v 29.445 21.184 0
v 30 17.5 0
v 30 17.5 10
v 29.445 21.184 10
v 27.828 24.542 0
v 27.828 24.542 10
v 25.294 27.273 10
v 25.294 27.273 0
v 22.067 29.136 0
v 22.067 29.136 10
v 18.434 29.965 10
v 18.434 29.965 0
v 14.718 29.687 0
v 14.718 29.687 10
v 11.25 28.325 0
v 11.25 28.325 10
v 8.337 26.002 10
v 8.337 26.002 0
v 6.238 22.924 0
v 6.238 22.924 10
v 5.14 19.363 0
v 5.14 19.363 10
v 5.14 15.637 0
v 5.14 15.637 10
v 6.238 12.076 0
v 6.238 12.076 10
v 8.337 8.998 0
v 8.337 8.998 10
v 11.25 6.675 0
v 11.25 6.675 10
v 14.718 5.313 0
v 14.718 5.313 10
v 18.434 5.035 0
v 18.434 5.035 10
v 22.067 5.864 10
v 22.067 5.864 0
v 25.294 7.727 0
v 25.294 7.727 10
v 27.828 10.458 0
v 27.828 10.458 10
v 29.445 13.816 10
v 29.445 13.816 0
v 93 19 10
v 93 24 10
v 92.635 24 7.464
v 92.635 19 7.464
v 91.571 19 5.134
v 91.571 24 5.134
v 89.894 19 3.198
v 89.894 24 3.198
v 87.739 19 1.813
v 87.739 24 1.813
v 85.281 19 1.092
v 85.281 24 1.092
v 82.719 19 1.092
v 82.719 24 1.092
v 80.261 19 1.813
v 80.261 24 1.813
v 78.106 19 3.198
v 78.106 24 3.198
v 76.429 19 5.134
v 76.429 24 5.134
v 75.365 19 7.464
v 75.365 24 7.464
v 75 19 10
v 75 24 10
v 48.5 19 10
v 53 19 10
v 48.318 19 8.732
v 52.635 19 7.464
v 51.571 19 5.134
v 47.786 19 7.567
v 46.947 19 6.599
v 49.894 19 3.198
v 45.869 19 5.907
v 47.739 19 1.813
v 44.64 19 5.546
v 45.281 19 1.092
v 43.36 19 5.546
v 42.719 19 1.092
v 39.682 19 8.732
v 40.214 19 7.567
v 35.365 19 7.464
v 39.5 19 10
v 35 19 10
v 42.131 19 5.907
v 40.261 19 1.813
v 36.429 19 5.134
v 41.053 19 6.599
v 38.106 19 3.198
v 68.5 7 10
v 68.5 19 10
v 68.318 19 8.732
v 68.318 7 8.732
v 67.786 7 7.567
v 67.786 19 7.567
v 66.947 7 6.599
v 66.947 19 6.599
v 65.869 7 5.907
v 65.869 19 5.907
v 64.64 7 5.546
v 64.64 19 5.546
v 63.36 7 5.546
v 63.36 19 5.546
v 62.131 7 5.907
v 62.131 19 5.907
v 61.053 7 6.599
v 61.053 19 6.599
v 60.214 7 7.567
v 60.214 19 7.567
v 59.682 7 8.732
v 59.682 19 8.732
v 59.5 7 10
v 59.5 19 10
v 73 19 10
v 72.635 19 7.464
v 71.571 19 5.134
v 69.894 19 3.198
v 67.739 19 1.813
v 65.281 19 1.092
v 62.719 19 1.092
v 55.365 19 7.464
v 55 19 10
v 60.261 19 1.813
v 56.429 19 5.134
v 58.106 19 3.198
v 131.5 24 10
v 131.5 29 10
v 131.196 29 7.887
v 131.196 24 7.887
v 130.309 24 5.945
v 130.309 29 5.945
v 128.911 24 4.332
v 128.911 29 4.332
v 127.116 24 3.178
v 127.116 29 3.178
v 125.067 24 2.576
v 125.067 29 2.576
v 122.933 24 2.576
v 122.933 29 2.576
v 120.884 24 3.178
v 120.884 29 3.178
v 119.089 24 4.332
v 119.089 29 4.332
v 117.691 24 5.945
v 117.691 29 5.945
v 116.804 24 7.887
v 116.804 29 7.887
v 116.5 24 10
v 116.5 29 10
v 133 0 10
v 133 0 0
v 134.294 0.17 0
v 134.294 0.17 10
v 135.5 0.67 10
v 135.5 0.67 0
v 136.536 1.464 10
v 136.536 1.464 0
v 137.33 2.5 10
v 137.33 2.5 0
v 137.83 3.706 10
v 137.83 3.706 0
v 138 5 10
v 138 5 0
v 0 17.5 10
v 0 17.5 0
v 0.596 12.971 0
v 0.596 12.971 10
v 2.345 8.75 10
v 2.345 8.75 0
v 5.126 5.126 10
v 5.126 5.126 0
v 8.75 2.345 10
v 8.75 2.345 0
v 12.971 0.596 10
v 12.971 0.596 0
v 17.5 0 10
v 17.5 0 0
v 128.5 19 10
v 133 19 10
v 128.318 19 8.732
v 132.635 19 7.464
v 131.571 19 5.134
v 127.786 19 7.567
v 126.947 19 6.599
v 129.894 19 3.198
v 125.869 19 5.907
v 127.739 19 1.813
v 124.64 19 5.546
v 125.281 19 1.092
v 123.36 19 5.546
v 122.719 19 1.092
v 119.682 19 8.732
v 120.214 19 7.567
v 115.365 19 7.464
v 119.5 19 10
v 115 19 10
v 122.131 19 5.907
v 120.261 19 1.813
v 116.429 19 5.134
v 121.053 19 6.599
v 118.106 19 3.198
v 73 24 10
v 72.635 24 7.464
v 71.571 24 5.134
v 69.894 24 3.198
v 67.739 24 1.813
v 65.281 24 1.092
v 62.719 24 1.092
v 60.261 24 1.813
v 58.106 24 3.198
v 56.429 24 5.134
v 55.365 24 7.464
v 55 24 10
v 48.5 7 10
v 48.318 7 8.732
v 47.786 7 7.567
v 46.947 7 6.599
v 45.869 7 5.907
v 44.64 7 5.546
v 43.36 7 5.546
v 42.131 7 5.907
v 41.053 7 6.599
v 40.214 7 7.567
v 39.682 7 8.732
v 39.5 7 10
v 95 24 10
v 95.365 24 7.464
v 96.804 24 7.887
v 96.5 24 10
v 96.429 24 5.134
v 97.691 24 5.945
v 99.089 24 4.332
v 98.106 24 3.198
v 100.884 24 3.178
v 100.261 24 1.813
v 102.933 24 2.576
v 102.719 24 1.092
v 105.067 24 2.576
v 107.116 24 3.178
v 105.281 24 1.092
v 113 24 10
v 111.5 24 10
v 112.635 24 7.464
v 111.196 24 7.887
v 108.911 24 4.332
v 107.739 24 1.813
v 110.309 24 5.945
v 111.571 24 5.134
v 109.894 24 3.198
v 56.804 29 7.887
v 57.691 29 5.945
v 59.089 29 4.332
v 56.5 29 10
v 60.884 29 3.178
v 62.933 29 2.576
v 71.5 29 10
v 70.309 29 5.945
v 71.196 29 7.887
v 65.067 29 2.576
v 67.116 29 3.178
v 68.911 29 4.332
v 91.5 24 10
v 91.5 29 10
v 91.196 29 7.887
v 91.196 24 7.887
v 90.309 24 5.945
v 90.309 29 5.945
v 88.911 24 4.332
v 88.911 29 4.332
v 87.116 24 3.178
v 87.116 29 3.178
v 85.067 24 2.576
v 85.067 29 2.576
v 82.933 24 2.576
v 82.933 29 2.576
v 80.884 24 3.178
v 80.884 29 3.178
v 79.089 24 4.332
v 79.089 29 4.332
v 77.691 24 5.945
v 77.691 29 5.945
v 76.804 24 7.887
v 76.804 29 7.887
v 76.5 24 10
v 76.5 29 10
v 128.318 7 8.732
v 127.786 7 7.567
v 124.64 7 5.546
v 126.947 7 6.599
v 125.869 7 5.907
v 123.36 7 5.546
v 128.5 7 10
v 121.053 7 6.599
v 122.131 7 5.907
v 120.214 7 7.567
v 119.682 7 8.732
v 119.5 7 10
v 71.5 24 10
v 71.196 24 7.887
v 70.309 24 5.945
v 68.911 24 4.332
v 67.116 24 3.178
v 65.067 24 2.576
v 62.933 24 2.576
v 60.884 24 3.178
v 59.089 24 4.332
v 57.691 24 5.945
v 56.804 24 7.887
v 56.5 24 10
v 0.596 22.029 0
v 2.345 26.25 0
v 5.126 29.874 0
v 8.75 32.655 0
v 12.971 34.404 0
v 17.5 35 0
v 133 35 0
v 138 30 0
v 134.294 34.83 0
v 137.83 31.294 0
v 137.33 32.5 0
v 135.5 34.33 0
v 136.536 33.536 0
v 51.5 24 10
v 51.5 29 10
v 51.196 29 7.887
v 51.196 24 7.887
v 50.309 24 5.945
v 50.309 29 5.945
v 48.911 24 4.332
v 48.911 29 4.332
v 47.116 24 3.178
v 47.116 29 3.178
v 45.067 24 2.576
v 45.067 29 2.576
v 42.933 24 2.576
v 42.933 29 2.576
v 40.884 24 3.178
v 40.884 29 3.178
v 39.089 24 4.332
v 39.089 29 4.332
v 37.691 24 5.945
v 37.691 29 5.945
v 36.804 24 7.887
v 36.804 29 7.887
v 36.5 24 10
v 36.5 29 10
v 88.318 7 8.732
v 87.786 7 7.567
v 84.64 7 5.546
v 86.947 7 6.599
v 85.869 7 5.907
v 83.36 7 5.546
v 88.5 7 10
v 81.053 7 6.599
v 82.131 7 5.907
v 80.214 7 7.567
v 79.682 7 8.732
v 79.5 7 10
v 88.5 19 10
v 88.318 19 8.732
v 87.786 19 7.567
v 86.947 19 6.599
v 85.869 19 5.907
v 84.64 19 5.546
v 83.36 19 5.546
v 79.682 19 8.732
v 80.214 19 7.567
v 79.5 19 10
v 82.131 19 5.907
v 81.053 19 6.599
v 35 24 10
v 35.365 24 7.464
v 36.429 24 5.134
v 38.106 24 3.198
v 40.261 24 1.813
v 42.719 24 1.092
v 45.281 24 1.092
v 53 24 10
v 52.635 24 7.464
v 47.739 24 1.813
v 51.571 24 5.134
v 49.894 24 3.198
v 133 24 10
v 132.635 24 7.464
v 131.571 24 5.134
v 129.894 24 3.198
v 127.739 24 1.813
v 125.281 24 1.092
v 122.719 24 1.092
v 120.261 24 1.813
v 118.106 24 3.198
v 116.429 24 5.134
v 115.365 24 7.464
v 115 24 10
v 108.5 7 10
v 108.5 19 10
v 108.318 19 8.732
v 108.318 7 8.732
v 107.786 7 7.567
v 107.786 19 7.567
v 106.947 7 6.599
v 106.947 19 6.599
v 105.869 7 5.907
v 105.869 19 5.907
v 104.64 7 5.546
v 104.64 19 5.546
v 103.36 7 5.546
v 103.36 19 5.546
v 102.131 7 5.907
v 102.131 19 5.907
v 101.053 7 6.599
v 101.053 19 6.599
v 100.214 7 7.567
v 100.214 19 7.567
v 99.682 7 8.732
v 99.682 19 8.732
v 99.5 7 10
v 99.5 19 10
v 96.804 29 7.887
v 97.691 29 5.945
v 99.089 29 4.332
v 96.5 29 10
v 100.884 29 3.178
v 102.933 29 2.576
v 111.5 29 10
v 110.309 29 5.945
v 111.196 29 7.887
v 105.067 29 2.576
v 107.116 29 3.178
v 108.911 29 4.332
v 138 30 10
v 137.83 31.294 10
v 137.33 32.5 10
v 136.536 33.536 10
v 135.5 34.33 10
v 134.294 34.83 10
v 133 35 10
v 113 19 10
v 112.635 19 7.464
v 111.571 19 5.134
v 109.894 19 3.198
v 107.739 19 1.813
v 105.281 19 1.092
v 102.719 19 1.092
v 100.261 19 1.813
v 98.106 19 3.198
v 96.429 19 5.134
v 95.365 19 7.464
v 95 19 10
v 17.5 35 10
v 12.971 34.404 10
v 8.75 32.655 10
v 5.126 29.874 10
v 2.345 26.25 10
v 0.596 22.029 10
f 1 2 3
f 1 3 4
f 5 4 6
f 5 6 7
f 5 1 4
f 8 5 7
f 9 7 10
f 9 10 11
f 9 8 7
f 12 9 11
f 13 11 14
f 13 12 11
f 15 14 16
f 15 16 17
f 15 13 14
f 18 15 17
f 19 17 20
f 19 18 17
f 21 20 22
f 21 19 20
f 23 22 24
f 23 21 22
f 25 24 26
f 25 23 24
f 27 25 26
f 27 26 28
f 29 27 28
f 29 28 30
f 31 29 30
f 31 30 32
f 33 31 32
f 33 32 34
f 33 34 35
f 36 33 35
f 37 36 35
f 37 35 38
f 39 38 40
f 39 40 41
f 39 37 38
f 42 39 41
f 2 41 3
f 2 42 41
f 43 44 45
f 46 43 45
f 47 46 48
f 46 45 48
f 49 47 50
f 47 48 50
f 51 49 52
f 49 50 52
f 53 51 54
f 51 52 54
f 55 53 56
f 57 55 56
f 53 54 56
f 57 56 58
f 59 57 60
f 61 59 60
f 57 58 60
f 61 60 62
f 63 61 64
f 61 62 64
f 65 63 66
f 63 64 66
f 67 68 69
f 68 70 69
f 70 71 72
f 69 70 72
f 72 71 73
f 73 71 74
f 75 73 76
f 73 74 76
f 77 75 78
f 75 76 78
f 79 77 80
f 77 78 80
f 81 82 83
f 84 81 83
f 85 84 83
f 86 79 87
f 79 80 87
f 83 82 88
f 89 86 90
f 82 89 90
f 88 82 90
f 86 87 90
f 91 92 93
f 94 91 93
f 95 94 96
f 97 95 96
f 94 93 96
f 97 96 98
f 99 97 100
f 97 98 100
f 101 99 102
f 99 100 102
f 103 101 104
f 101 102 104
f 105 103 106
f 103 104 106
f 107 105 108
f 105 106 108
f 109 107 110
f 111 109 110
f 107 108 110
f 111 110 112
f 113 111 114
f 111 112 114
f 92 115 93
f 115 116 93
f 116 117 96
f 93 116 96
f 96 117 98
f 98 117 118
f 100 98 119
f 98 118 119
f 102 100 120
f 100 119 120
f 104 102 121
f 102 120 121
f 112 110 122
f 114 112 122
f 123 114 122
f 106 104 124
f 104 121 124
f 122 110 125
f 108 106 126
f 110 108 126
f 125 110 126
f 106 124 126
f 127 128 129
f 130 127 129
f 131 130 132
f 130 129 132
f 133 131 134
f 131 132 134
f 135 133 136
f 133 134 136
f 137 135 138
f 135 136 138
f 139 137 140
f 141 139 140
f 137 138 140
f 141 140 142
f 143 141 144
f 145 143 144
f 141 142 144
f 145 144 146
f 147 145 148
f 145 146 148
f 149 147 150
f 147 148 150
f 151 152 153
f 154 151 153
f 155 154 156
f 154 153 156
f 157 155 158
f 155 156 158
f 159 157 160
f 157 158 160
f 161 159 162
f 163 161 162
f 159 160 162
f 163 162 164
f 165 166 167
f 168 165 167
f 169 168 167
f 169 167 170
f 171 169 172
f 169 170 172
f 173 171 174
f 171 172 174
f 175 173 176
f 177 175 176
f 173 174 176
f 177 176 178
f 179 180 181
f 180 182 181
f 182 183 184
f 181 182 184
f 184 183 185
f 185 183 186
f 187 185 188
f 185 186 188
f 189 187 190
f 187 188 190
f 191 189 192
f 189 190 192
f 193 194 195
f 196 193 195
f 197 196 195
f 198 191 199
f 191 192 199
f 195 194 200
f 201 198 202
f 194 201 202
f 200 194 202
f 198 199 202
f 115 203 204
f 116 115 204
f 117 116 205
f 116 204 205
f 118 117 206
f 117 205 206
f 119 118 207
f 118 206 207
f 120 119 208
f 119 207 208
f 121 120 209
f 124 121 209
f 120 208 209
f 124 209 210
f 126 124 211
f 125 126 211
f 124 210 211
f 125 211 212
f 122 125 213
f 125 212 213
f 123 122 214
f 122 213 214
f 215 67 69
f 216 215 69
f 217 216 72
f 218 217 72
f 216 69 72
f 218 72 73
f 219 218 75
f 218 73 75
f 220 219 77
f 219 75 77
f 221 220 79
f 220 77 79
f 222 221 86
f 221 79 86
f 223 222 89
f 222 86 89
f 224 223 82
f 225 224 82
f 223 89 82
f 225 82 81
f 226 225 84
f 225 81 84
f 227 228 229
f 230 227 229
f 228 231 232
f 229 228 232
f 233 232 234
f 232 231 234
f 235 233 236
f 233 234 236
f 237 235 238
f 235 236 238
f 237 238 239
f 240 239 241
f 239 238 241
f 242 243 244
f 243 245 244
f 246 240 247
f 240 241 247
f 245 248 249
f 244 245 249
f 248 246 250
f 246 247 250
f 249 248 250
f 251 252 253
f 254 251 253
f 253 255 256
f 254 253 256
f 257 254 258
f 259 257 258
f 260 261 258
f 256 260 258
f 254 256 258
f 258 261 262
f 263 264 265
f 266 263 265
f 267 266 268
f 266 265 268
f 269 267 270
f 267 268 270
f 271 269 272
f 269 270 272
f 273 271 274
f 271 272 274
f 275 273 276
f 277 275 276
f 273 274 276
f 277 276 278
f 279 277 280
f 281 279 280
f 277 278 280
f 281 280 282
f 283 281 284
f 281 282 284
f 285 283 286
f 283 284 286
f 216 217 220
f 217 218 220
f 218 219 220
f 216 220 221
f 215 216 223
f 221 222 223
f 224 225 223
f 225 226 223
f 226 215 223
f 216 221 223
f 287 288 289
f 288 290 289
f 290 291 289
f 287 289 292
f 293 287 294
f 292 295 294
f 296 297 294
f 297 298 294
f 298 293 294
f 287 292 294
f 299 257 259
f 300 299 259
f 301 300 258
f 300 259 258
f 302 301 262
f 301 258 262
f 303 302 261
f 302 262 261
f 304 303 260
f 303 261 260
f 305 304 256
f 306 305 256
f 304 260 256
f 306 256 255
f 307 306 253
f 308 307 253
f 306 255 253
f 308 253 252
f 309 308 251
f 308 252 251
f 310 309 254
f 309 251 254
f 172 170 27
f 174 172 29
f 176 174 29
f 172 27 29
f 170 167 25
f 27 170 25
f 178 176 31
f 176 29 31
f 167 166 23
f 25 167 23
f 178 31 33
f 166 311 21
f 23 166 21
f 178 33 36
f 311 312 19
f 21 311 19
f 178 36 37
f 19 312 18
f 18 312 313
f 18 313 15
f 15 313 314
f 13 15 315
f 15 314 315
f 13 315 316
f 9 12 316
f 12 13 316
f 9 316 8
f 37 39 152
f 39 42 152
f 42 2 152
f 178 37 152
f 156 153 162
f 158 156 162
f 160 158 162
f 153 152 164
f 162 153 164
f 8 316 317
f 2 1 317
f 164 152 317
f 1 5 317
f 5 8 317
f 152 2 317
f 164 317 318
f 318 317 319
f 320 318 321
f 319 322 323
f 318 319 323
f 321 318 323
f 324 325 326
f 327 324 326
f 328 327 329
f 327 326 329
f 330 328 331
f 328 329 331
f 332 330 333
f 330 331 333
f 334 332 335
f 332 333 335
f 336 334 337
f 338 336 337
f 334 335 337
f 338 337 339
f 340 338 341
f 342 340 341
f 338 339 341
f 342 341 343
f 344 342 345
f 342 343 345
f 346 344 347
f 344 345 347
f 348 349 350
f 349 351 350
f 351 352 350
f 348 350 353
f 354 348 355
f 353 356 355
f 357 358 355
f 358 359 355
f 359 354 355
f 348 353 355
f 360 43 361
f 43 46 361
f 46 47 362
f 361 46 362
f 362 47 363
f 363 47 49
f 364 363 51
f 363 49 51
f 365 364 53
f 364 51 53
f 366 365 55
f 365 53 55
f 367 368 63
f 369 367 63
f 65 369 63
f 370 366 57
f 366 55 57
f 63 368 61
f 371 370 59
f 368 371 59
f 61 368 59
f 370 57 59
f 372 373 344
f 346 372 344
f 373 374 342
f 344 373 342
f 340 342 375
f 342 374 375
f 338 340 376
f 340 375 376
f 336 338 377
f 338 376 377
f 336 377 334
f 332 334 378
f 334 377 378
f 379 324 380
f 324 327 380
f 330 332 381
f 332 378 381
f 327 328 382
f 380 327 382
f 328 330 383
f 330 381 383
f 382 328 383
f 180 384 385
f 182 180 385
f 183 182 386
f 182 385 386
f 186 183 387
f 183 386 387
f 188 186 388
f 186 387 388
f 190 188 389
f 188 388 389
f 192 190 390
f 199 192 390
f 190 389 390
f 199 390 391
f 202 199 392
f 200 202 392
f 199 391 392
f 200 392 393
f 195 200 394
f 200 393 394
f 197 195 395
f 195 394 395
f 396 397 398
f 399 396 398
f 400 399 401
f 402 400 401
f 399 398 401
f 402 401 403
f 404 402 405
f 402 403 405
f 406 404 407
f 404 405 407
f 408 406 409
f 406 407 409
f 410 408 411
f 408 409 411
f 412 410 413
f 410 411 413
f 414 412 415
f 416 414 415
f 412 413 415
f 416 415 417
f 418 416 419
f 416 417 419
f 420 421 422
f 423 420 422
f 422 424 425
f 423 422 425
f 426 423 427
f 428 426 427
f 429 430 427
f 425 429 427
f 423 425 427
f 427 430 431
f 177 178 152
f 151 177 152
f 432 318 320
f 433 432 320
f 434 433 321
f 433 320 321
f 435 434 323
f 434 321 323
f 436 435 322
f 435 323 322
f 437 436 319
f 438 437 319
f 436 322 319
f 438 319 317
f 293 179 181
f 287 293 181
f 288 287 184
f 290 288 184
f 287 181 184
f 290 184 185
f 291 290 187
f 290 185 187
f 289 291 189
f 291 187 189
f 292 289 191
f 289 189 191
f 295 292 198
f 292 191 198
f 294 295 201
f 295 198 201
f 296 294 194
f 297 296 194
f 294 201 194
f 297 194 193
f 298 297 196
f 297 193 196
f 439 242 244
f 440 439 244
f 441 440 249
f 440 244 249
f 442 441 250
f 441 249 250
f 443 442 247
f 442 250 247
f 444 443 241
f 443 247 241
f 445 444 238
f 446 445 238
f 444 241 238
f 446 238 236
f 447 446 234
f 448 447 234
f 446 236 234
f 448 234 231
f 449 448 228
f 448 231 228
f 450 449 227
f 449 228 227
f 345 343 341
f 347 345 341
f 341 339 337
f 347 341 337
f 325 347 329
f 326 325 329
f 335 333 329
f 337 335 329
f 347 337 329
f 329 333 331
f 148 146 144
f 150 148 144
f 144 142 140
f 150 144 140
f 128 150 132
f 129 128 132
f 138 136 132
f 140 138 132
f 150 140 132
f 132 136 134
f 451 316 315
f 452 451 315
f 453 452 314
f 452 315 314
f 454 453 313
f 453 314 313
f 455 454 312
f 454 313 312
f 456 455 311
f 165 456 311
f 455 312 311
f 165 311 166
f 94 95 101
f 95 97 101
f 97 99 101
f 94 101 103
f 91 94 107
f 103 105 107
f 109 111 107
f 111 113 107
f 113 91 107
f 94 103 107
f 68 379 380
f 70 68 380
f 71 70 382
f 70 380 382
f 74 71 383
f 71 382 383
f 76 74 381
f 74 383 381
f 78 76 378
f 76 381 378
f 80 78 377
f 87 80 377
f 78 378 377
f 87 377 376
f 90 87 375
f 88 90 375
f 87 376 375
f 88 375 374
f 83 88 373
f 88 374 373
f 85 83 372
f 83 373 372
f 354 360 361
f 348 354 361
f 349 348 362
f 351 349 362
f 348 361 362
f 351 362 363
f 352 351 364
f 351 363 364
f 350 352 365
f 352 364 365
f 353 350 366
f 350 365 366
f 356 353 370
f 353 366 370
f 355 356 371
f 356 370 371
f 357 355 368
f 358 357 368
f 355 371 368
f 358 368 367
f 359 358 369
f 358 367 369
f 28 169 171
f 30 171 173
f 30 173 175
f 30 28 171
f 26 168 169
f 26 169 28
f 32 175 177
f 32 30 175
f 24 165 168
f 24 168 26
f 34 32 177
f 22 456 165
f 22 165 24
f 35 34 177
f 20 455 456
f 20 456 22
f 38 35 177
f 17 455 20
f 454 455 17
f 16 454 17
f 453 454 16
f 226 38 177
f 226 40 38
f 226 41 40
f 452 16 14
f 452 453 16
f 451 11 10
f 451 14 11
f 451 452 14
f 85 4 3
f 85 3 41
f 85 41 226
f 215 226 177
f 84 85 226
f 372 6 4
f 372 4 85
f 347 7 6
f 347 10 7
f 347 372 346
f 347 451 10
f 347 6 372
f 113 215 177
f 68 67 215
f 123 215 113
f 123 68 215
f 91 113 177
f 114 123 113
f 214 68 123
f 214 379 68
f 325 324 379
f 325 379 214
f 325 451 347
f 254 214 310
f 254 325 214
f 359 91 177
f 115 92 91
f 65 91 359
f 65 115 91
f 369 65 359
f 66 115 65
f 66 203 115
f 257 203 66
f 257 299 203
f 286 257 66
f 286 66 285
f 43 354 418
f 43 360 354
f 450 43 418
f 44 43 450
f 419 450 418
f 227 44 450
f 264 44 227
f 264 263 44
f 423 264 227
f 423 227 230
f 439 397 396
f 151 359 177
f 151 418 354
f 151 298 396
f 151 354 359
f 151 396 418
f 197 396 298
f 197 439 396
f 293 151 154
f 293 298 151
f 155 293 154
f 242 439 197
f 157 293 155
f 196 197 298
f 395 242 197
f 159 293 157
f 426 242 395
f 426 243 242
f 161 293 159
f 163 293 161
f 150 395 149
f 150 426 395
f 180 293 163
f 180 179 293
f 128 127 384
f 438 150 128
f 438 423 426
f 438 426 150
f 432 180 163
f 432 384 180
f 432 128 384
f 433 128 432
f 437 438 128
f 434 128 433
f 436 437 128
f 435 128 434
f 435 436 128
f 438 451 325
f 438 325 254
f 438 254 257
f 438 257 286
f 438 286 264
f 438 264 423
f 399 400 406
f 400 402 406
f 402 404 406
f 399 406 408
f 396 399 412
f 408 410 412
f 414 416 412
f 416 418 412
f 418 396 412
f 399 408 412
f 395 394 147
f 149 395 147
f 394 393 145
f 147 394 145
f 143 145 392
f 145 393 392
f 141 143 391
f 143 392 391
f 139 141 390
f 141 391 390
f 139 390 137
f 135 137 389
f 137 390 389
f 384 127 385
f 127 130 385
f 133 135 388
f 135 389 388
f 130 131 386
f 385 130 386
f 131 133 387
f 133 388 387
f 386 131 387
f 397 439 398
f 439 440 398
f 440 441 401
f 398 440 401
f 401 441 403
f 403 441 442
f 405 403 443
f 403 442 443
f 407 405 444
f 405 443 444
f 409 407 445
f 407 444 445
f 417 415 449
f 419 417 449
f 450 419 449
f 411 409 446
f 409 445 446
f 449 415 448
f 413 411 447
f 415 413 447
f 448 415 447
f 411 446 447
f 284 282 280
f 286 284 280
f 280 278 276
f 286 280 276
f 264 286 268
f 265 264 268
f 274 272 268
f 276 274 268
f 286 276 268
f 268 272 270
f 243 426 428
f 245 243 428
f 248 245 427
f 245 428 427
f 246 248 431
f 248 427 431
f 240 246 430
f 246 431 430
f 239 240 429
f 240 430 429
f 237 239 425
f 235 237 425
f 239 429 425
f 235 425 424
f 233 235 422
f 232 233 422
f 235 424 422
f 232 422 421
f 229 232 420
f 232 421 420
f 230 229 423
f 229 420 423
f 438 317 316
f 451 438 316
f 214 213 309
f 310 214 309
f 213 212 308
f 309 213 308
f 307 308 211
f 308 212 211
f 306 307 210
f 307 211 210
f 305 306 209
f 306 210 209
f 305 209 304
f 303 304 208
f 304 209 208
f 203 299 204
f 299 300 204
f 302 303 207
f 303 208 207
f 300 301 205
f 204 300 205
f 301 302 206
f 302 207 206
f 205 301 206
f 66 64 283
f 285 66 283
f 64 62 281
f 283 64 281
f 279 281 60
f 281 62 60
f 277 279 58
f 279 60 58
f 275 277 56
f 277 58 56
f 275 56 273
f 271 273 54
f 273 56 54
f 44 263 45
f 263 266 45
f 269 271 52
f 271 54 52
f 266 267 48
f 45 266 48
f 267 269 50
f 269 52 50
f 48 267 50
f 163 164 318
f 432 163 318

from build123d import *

# Parameters (mm, degrees)
F0_R     = 12.5
F1_DEPTH = 10


with BuildPart() as f1:
    # F0 (on Top) → F1 (new body)
    with BuildSketch(Plane.XY):
        with BuildLine():
            ThreePointArc((0, 17.5), (5.125631, 5.125631), (17.5, 0))
            Line((17.5, 0), (133, 0))
            ThreePointArc((133, 0), (136.535534, 1.464466), (138, 5))
            Line((138, 5), (138, 30))
            ThreePointArc((138, 30), (136.535534, 33.535534), (133, 35))
            Line((133, 35), (17.5, 35))
            ThreePointArc((17.5, 35), (5.125631, 29.874369), (0, 17.5))
        make_face()
        with Locations((17.5, 17.5)):
            Circle(F0_R, mode=Mode.SUBTRACT)
    extrude(amount=F1_DEPTH)

    # F2 (on face) → F3 (revolve, cut)
    with BuildSketch(Plane.XY.offset(10)):
        Polygon((44, 19), (44, 7), (48.5, 7), (48.5, 19), (53, 19), (53, 24), (51.5, 24), (51.5, 29), (44, 29), (44, 24), align=None)
    revolve(axis=Axis((44, 13, 10), (0, 1, 0)), mode=Mode.SUBTRACT)

    # F2 (on face) → F4 (revolve, cut)
    with BuildSketch(Plane.XY.offset(10)):
        Polygon((64, 19), (64, 7), (68.5, 7), (68.5, 19), (73, 19), (73, 24), (71.5, 24), (71.5, 29), (64, 29), (64, 24), align=None)
    revolve(axis=Axis((64, 21.5, 10), (0, 1, 0)), mode=Mode.SUBTRACT)

    # F2 (on face) → F5 (revolve, cut)
    with BuildSketch(Plane.XY.offset(10)):
        Polygon((84, 19), (84, 7), (88.5, 7), (88.5, 19), (93, 19), (93, 24), (91.5, 24), (91.5, 29), (84, 29), (84, 24), align=None)
    revolve(axis=Axis((84, 21.5, 10), (0, 1, 0)), mode=Mode.SUBTRACT)

    # F2 (on face) → F6 (revolve, cut)
    with BuildSketch(Plane.XY.offset(10)):
        Polygon((104, 19), (104, 7), (108.5, 7), (108.5, 19), (113, 19), (113, 24), (111.5, 24), (111.5, 29), (104, 29), (104, 24), align=None)
    revolve(axis=Axis((104, 13, 10), (0, 1, 0)), mode=Mode.SUBTRACT)

    # F2 (on face) → F7 (revolve, cut)
    with BuildSketch(Plane.XY.offset(10)):
        Polygon((124, 19), (124, 7), (128.5, 7), (128.5, 19), (133, 19), (133, 24), (131.5, 24), (131.5, 29), (124, 29), (124, 24), align=None)
    revolve(axis=Axis((124, 13, 10), (0, 1, 0)), mode=Mode.SUBTRACT)


solid = f1.part
